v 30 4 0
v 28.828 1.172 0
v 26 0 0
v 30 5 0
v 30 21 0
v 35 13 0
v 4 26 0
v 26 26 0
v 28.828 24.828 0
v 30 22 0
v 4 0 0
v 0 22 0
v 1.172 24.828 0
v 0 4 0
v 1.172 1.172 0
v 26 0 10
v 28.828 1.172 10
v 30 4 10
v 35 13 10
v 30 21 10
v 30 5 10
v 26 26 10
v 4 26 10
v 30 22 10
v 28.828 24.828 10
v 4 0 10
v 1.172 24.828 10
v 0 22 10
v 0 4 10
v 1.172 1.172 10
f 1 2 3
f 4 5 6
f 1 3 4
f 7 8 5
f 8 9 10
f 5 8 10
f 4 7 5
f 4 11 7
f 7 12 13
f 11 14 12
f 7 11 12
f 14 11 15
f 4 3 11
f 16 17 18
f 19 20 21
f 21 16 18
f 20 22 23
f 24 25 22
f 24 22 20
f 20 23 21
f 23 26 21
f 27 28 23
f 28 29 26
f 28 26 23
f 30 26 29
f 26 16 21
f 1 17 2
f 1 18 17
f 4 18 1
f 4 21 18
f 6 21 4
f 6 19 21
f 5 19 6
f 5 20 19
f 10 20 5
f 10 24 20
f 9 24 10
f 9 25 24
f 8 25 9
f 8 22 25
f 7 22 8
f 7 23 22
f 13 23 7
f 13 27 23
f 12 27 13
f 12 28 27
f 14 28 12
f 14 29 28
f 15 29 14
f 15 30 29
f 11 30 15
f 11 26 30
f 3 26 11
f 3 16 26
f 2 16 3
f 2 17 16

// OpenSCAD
$fn = 32;

// ----------------------------------------------------------------------
// Ratchet pawl: 30 x 26 mm body, beak 5 mm с правого торца
// ----------------------------------------------------------------------

// --- parameters (mm) ---
profile_height = 10;      // extrusion height
profile_points = 15;      // points of the closed outline

profile = [[0, 4], [1.172, 1.172], [4, 0], [26, 0], [28.828, 1.172], [30, 4], [30, 5], [35, 13], [30, 21], [30, 22], [28.828, 24.828], [26, 26], [4, 26], [1.172, 24.828], [0, 22]];  // single closed polygon, 15 points, counter clockwise

// --- the one profile operation ---
linear_extrude(height = profile_height) polygon(points = profile);
